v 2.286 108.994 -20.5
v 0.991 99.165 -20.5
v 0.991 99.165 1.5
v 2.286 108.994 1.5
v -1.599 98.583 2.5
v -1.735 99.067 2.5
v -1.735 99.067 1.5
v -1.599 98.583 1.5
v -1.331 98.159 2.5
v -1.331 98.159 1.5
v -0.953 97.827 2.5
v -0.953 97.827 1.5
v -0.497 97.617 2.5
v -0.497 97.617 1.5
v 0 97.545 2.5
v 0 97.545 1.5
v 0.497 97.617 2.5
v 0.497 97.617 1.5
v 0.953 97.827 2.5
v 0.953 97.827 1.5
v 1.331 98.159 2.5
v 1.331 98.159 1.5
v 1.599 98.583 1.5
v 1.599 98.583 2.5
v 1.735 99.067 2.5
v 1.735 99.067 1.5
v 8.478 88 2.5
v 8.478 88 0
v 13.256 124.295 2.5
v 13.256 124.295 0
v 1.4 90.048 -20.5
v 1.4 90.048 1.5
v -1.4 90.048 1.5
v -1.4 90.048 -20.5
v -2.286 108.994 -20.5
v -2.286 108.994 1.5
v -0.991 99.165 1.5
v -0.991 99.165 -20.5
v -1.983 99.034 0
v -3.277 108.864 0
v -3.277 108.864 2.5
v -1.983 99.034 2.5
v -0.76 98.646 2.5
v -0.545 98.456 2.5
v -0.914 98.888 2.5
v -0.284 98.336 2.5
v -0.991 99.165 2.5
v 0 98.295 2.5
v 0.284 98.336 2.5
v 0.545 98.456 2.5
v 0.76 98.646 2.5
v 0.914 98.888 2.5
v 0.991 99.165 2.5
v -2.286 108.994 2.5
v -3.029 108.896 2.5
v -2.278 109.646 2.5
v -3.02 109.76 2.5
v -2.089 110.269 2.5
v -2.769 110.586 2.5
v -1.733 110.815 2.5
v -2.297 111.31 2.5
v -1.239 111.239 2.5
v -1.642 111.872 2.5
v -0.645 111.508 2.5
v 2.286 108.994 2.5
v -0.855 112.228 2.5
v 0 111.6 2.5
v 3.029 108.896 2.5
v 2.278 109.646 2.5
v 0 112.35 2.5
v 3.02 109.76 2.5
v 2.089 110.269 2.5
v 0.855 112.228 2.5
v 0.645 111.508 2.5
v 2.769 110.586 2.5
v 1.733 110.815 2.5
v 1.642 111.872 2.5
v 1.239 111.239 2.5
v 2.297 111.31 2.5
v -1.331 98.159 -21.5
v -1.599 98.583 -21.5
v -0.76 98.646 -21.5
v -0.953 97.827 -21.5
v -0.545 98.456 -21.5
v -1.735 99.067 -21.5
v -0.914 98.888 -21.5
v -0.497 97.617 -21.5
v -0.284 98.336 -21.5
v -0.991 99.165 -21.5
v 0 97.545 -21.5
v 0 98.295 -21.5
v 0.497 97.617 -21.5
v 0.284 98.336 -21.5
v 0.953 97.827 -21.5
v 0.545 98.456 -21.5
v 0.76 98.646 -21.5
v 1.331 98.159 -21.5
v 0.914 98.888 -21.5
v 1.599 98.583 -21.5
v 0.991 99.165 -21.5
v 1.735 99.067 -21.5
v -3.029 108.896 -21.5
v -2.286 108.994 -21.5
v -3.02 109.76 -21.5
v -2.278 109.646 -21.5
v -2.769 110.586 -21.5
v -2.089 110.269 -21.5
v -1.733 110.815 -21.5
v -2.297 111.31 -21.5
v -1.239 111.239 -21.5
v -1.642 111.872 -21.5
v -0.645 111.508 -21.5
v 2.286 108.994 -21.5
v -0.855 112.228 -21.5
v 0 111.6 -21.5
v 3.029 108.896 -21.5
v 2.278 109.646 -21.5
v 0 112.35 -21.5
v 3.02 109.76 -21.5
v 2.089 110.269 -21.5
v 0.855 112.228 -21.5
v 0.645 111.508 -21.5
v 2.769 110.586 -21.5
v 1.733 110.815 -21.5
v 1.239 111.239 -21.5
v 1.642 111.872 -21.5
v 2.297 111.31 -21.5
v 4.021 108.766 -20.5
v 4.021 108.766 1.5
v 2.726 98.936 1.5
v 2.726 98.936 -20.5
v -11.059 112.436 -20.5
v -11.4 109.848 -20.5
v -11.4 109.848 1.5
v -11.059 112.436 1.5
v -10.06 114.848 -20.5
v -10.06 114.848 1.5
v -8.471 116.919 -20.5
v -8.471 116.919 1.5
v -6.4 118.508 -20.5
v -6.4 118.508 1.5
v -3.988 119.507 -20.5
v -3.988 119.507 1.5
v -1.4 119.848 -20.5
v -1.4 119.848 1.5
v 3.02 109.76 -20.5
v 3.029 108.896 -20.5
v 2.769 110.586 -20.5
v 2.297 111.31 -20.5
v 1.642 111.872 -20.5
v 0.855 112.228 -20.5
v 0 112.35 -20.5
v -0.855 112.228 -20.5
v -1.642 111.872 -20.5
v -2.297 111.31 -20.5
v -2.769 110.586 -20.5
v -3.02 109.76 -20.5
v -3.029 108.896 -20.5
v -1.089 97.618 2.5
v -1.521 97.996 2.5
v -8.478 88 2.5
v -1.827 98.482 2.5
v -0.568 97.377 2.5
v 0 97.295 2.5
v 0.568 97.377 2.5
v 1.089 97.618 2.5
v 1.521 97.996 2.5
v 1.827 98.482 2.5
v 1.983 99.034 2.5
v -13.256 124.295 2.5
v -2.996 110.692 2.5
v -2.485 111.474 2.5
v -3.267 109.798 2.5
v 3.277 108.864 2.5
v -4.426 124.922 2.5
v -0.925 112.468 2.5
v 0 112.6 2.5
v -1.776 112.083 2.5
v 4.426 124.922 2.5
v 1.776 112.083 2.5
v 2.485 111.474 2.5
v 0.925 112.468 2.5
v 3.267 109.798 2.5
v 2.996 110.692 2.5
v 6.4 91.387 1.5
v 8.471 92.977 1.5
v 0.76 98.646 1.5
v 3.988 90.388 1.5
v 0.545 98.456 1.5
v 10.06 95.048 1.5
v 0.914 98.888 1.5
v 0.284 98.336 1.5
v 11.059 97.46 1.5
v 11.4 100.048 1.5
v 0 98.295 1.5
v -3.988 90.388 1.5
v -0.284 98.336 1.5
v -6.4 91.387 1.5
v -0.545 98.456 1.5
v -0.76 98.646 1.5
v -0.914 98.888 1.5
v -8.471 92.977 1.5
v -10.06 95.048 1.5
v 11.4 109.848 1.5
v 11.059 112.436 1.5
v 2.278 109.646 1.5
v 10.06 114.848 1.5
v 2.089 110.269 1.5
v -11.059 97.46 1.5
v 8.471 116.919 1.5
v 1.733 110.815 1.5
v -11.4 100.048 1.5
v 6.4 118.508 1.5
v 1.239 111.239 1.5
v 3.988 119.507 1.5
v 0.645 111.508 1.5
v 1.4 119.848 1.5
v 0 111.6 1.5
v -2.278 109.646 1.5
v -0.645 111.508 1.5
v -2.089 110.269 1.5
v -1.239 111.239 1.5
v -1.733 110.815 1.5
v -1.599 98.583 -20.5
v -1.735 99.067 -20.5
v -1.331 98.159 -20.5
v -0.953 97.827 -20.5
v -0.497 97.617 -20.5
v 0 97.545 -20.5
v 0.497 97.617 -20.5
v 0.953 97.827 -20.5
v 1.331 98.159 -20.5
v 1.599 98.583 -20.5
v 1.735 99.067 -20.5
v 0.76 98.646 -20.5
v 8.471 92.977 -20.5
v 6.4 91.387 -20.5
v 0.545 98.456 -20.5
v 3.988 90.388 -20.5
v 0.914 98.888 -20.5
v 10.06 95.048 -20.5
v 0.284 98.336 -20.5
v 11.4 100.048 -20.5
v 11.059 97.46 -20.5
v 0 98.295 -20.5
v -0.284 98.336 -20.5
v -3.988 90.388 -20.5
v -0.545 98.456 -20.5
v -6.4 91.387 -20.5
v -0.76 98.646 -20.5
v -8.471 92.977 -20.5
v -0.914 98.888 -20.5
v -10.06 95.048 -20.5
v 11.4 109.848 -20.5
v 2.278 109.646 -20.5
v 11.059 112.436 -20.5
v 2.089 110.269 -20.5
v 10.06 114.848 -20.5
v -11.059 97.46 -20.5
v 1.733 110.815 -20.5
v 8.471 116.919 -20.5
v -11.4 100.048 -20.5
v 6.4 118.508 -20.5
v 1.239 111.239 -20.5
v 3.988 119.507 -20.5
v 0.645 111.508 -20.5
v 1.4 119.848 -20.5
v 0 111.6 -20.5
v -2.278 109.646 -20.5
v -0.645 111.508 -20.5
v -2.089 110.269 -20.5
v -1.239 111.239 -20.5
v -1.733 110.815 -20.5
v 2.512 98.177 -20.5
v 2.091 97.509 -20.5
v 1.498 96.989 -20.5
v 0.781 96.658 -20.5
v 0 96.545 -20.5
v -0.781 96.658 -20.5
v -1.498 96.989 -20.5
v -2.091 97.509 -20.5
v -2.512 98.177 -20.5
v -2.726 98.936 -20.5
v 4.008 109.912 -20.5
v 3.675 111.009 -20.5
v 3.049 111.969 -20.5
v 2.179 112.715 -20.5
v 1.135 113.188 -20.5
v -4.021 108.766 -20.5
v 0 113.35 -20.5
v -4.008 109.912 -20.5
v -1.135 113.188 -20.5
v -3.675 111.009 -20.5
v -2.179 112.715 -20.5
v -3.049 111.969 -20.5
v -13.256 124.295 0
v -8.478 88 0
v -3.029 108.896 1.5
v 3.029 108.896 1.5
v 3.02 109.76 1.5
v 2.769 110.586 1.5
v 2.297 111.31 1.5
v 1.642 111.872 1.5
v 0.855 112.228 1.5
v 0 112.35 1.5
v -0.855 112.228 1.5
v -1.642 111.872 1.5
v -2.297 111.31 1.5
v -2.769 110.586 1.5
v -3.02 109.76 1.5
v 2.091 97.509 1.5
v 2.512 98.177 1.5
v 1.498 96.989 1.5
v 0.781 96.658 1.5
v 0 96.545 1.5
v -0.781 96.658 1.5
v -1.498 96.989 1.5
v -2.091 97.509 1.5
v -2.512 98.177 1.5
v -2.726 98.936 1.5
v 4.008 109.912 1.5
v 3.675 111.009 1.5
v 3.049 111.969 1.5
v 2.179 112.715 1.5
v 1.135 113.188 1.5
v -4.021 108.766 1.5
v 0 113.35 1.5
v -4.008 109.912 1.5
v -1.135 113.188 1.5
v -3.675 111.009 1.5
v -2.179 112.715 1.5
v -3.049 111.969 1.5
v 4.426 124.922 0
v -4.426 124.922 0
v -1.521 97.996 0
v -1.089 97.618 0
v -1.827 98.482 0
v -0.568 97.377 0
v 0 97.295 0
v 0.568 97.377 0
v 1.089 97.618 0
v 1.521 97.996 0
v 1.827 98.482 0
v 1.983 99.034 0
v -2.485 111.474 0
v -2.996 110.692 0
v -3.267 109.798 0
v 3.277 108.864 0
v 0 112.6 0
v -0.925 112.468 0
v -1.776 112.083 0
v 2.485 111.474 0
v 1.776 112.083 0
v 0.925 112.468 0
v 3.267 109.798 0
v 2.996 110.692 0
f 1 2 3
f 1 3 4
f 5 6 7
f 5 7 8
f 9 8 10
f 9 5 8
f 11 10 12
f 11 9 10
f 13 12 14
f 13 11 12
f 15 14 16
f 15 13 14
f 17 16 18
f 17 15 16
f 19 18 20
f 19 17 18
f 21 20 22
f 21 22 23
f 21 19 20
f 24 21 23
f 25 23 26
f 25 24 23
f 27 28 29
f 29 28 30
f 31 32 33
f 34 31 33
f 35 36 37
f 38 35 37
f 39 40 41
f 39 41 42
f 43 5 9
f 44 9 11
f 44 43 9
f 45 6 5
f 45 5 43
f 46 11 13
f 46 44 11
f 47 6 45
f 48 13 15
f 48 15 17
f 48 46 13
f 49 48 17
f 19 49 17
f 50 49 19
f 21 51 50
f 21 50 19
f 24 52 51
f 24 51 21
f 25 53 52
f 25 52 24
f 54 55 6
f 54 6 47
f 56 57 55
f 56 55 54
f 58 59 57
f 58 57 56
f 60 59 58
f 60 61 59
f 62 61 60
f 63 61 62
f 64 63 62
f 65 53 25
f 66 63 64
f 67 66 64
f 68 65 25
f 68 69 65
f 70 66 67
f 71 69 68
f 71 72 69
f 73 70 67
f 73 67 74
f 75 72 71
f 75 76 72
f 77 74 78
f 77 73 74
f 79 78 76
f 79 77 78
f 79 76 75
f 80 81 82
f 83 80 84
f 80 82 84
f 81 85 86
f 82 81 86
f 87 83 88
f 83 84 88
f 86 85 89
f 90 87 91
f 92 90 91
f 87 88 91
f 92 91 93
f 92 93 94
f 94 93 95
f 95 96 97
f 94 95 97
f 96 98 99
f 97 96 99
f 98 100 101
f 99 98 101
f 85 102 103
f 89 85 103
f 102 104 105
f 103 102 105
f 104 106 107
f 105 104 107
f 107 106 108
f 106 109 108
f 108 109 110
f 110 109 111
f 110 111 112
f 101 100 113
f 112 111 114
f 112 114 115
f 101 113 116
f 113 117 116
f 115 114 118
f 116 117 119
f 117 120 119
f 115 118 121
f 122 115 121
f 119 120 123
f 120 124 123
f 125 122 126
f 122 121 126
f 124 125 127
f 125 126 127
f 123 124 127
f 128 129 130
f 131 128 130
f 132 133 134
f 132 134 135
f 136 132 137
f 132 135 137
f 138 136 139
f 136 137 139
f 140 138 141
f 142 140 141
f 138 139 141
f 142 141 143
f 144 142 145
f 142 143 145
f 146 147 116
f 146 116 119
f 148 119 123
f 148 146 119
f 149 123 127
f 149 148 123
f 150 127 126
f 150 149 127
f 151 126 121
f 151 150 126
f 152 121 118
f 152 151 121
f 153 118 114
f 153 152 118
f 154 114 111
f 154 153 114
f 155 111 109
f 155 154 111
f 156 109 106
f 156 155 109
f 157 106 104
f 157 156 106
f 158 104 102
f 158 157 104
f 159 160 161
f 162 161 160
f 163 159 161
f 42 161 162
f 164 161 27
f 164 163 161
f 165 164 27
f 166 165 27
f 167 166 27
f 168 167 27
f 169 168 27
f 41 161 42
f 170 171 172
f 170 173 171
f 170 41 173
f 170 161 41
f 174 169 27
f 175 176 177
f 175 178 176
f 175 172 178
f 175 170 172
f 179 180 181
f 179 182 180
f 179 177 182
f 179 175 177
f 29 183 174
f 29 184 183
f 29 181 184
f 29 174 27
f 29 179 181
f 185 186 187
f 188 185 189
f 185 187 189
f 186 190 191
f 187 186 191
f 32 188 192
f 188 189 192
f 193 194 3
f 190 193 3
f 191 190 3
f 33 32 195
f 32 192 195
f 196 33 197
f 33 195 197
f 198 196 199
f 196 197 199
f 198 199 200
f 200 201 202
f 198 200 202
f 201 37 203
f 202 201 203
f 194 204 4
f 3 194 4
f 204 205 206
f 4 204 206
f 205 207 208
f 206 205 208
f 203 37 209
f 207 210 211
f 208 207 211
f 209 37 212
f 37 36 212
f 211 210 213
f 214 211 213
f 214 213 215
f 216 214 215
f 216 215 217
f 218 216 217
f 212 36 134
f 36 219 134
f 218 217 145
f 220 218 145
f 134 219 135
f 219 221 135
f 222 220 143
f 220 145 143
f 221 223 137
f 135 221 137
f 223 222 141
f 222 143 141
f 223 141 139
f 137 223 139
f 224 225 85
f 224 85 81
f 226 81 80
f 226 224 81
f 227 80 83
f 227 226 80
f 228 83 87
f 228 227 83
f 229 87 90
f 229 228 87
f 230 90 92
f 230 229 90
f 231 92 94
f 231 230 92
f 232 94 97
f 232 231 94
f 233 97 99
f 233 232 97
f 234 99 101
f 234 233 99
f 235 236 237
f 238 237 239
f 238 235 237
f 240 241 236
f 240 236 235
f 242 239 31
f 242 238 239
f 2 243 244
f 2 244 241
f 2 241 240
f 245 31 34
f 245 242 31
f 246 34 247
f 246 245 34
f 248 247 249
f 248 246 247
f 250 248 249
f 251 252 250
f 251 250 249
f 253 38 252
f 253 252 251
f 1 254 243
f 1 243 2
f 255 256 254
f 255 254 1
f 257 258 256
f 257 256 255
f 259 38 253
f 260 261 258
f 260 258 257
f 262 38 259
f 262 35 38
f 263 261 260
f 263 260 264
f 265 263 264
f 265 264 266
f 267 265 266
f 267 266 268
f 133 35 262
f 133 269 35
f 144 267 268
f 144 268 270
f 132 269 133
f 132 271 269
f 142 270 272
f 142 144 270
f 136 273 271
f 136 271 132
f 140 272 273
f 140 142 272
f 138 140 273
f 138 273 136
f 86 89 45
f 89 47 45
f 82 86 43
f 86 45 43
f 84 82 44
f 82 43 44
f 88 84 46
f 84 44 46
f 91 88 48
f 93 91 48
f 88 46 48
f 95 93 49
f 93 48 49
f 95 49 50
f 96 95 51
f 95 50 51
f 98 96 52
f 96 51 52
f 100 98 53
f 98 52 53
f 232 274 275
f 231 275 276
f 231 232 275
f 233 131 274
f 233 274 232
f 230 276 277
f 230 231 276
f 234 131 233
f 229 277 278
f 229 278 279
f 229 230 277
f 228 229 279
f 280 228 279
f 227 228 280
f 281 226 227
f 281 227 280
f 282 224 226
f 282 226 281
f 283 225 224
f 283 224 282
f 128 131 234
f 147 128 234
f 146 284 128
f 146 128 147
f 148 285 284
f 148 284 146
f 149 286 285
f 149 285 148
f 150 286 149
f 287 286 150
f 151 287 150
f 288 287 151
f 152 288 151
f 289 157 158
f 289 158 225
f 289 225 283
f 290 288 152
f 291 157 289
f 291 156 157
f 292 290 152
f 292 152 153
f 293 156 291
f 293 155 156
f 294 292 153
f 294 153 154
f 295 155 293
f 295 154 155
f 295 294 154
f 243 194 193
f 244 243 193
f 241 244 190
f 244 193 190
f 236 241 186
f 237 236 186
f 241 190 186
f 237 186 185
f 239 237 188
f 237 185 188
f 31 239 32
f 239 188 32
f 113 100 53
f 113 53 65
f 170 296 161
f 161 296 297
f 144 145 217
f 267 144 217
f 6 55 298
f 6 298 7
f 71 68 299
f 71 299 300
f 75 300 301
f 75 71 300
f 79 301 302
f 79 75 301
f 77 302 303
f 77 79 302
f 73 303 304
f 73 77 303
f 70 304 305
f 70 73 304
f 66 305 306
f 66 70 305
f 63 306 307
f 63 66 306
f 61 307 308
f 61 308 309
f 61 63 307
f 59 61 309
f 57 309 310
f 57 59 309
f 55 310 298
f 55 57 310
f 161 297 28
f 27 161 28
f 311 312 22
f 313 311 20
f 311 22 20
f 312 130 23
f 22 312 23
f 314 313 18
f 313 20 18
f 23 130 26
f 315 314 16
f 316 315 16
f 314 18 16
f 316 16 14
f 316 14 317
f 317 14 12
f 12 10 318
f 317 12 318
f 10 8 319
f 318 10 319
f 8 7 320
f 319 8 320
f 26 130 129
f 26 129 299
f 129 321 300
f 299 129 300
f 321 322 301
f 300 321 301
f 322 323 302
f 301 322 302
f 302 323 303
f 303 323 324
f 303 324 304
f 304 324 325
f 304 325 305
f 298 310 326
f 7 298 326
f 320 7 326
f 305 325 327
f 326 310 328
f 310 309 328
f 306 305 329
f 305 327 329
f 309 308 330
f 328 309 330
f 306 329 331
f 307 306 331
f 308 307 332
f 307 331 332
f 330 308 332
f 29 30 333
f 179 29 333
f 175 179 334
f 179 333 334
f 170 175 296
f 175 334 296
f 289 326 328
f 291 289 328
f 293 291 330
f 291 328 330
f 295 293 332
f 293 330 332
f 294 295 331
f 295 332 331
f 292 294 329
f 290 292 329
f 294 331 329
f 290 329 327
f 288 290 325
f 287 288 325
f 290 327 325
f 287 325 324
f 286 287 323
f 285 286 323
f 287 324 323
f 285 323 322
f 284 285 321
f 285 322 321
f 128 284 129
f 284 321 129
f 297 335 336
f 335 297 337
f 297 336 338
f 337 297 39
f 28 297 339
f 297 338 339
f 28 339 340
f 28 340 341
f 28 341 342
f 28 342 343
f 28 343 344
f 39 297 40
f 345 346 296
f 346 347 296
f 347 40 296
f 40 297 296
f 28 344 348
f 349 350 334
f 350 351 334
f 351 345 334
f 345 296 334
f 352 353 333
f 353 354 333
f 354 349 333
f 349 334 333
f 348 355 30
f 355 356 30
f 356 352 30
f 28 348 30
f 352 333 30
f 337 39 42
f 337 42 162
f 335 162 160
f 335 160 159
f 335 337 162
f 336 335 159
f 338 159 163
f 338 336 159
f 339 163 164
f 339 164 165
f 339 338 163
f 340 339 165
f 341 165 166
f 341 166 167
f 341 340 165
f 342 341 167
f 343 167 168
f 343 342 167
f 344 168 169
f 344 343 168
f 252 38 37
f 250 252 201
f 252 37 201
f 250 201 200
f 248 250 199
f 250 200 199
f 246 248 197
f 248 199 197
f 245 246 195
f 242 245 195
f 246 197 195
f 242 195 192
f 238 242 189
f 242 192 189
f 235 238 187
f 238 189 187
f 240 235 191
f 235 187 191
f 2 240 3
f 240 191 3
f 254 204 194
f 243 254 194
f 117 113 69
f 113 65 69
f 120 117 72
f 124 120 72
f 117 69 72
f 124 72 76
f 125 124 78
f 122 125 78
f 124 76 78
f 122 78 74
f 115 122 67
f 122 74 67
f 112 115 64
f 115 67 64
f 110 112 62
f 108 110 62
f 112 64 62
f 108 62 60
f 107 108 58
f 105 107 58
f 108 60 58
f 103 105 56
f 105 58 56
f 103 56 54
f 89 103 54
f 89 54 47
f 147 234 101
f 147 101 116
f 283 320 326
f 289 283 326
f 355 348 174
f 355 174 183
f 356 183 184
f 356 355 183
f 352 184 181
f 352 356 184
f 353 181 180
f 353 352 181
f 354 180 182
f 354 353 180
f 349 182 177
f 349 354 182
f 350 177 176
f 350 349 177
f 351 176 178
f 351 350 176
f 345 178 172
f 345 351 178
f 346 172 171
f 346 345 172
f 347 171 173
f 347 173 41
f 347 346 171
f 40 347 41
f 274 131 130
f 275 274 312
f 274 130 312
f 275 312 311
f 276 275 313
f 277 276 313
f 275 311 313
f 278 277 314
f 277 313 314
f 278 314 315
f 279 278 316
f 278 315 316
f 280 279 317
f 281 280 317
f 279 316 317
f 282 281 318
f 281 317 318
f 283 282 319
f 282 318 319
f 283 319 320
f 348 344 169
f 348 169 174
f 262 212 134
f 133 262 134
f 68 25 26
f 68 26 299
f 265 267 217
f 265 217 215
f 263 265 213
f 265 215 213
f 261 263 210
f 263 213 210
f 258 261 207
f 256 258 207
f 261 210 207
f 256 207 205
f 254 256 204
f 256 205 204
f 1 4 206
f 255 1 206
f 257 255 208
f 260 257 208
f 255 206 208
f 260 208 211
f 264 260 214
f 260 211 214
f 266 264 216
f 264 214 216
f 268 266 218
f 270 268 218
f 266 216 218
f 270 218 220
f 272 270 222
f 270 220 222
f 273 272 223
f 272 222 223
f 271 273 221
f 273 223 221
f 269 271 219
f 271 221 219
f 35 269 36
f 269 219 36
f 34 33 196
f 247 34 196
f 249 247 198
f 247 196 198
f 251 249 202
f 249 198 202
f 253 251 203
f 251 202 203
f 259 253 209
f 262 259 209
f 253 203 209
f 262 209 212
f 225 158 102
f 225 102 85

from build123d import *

# Parameters (mm, degrees)
BOSS_EXTRUDE1_DEPTH = 2.5
BOSS_EXTRUDE2_DEPTH = 1
BOSS_EXTRUDE3_DEPTH = 22
BOSS_EXTRUDE4_START = -23
BOSS_EXTRUDE4_DEPTH = 1
BOSS_EXTRUDE5_DEPTH = 22


with BuildPart() as part:
    # Sketch2 → Boss-Extrude1 (new body)
    with BuildSketch(Plane.XY):
        with BuildLine():
            Line((-8.478043415, 88), (8.478043415, 88))
            Line((8.478043415, 88), (13.2563821, 124.295085718))
            ThreePointArc((13.2563821, 124.295085718), (0, 125), (-13.2563821, 124.295085718))
            Line((-13.2563821, 124.295085718), (-8.478043415, 88))
        make_face()
        with BuildLine():
            Line((-3.276984948, 108.863662465), (-1.982889723, 99.034033333))
            ThreePointArc((-1.982889723, 99.034033333), (0, 97.295085718), (1.982889723, 99.034033333))
            Line((1.982889723, 99.034033333), (3.276984948, 108.863662465))
            ThreePointArc((3.276984948, 108.863662465), (0, 112.60034764), (-3.276984948, 108.863662465))
        make_face(mode=Mode.SUBTRACT)
    extrude(amount=BOSS_EXTRUDE1_DEPTH)


with BuildPart() as body_2:
    # Sketch4 → Boss-Extrude2 (new body)
    with BuildSketch(Plane.XY.offset(2.5)):
        with BuildLine():
            Line((-3.029123733, 108.896294013), (-1.735028507, 99.066664882))
            ThreePointArc((-1.735028507, 99.066664882), (0, 97.545085718), (1.735028507, 99.066664882))
            Line((1.735028507, 99.066664882), (3.029123733, 108.896294013))
            ThreePointArc((3.029123733, 108.896294013), (0, 112.35034764), (-3.029123733, 108.896294013))
        make_face()
        with BuildLine():
            Line((0.991444861, 99.164559526), (2.285540087, 108.994188657))
            ThreePointArc((2.285540087, 108.994188657), (0, 111.60034764), (-2.285540087, 108.994188657))
            Line((-2.285540087, 108.994188657), (-0.991444861, 99.164559526))
            ThreePointArc((-0.991444861, 99.164559526), (0, 98.295085718), (0.991444861, 99.164559526))
        make_face(mode=Mode.SUBTRACT)
    extrude(amount=-BOSS_EXTRUDE2_DEPTH)

    # Sketch6 → Boss-Extrude3 (add)
    with BuildSketch(Plane(origin=(0, 0, 1.5), x_dir=(-1, 0, 0), z_dir=(0, 0, -1))):
        with BuildLine():
            Line((2.726473369, 98.936138689), (4.020568594, 108.765767821))
            ThreePointArc((4.020568594, 108.765767821), (0, 113.35034764), (-4.020568594, 108.765767821))
            Line((-4.020568594, 108.765767821), (-2.726473369, 98.936138689))
            ThreePointArc((-2.726473369, 98.936138689), (0, 96.545085718), (2.726473369, 98.936138689))
        make_face()
        with BuildLine():
            Line((2.285540087, 108.994188657), (0.991444861, 99.164559526))
            ThreePointArc((0.991444861, 99.164559526), (0, 98.295085718), (-0.991444861, 99.164559526))
            Line((-0.991444861, 99.164559526), (-2.285540087, 108.994188657))
            ThreePointArc((-2.285540087, 108.994188657), (0, 111.60034764), (2.285540087, 108.994188657))
        make_face(mode=Mode.SUBTRACT)
    extrude(amount=BOSS_EXTRUDE3_DEPTH)

    # Sketch7 → Boss-Extrude4 (add)
    with BuildSketch(Plane.XY.offset(2.5).offset(BOSS_EXTRUDE4_START)):
        with BuildLine():
            Line((1.735028507, 99.066664882), (3.029123733, 108.896294013))
            ThreePointArc((3.029123733, 108.896294013), (0, 112.35034764), (-3.029123733, 108.896294013))
            Line((-3.029123733, 108.896294013), (-1.735028507, 99.066664882))
            ThreePointArc((-1.735028507, 99.066664882), (0, 97.545085718), (1.735028507, 99.066664882))
        make_face()
        with BuildLine():
            Line((0.991444861, 99.164559526), (2.285540087, 108.994188657))
            ThreePointArc((2.285540087, 108.994188657), (0, 111.60034764), (-2.285540087, 108.994188657))
            Line((-2.285540087, 108.994188657), (-0.991444861, 99.164559526))
            ThreePointArc((-0.991444861, 99.164559526), (0, 98.295085718), (0.991444861, 99.164559526))
        make_face(mode=Mode.SUBTRACT)
    extrude(amount=-BOSS_EXTRUDE4_DEPTH)


with BuildPart() as body_3:
    # Sketch9 → Boss-Extrude5 (new body)
    with BuildSketch(Plane.XY.offset(1.5)):
        with BuildLine():
            Line((-1.4, 119.847716679), (1.4, 119.847716679))
            ThreePointArc((1.4, 119.847716679), (8.471067812, 116.918784491), (11.4, 109.847716679))
            Line((11.4, 109.847716679), (11.4, 100.047716679))
            ThreePointArc((11.4, 100.047716679), (8.471067812, 92.976648867), (1.4, 90.047716679))
            Line((1.4, 90.047716679), (-1.4, 90.047716679))
            ThreePointArc((-1.4, 90.047716679), (-8.471067812, 92.976648867), (-11.4, 100.047716679))
            Line((-11.4, 100.047716679), (-11.4, 109.847716679))
            ThreePointArc((-11.4, 109.847716679), (-8.471067812, 116.918784491), (-1.4, 119.847716679))
        make_face()
        with BuildLine():
            Line((0.991444861, 99.164559526), (2.285540087, 108.994188657))
            ThreePointArc((2.285540087, 108.994188657), (0, 111.60034764), (-2.285540087, 108.994188657))
            Line((-2.285540087, 108.994188657), (-0.991444861, 99.164559526))
            ThreePointArc((-0.991444861, 99.164559526), (0, 98.295085718), (0.991444861, 99.164559526))
        make_face(mode=Mode.SUBTRACT)
    extrude(amount=-BOSS_EXTRUDE5_DEPTH)


solid = Compound([part.part, body_2.part, body_3.part])
